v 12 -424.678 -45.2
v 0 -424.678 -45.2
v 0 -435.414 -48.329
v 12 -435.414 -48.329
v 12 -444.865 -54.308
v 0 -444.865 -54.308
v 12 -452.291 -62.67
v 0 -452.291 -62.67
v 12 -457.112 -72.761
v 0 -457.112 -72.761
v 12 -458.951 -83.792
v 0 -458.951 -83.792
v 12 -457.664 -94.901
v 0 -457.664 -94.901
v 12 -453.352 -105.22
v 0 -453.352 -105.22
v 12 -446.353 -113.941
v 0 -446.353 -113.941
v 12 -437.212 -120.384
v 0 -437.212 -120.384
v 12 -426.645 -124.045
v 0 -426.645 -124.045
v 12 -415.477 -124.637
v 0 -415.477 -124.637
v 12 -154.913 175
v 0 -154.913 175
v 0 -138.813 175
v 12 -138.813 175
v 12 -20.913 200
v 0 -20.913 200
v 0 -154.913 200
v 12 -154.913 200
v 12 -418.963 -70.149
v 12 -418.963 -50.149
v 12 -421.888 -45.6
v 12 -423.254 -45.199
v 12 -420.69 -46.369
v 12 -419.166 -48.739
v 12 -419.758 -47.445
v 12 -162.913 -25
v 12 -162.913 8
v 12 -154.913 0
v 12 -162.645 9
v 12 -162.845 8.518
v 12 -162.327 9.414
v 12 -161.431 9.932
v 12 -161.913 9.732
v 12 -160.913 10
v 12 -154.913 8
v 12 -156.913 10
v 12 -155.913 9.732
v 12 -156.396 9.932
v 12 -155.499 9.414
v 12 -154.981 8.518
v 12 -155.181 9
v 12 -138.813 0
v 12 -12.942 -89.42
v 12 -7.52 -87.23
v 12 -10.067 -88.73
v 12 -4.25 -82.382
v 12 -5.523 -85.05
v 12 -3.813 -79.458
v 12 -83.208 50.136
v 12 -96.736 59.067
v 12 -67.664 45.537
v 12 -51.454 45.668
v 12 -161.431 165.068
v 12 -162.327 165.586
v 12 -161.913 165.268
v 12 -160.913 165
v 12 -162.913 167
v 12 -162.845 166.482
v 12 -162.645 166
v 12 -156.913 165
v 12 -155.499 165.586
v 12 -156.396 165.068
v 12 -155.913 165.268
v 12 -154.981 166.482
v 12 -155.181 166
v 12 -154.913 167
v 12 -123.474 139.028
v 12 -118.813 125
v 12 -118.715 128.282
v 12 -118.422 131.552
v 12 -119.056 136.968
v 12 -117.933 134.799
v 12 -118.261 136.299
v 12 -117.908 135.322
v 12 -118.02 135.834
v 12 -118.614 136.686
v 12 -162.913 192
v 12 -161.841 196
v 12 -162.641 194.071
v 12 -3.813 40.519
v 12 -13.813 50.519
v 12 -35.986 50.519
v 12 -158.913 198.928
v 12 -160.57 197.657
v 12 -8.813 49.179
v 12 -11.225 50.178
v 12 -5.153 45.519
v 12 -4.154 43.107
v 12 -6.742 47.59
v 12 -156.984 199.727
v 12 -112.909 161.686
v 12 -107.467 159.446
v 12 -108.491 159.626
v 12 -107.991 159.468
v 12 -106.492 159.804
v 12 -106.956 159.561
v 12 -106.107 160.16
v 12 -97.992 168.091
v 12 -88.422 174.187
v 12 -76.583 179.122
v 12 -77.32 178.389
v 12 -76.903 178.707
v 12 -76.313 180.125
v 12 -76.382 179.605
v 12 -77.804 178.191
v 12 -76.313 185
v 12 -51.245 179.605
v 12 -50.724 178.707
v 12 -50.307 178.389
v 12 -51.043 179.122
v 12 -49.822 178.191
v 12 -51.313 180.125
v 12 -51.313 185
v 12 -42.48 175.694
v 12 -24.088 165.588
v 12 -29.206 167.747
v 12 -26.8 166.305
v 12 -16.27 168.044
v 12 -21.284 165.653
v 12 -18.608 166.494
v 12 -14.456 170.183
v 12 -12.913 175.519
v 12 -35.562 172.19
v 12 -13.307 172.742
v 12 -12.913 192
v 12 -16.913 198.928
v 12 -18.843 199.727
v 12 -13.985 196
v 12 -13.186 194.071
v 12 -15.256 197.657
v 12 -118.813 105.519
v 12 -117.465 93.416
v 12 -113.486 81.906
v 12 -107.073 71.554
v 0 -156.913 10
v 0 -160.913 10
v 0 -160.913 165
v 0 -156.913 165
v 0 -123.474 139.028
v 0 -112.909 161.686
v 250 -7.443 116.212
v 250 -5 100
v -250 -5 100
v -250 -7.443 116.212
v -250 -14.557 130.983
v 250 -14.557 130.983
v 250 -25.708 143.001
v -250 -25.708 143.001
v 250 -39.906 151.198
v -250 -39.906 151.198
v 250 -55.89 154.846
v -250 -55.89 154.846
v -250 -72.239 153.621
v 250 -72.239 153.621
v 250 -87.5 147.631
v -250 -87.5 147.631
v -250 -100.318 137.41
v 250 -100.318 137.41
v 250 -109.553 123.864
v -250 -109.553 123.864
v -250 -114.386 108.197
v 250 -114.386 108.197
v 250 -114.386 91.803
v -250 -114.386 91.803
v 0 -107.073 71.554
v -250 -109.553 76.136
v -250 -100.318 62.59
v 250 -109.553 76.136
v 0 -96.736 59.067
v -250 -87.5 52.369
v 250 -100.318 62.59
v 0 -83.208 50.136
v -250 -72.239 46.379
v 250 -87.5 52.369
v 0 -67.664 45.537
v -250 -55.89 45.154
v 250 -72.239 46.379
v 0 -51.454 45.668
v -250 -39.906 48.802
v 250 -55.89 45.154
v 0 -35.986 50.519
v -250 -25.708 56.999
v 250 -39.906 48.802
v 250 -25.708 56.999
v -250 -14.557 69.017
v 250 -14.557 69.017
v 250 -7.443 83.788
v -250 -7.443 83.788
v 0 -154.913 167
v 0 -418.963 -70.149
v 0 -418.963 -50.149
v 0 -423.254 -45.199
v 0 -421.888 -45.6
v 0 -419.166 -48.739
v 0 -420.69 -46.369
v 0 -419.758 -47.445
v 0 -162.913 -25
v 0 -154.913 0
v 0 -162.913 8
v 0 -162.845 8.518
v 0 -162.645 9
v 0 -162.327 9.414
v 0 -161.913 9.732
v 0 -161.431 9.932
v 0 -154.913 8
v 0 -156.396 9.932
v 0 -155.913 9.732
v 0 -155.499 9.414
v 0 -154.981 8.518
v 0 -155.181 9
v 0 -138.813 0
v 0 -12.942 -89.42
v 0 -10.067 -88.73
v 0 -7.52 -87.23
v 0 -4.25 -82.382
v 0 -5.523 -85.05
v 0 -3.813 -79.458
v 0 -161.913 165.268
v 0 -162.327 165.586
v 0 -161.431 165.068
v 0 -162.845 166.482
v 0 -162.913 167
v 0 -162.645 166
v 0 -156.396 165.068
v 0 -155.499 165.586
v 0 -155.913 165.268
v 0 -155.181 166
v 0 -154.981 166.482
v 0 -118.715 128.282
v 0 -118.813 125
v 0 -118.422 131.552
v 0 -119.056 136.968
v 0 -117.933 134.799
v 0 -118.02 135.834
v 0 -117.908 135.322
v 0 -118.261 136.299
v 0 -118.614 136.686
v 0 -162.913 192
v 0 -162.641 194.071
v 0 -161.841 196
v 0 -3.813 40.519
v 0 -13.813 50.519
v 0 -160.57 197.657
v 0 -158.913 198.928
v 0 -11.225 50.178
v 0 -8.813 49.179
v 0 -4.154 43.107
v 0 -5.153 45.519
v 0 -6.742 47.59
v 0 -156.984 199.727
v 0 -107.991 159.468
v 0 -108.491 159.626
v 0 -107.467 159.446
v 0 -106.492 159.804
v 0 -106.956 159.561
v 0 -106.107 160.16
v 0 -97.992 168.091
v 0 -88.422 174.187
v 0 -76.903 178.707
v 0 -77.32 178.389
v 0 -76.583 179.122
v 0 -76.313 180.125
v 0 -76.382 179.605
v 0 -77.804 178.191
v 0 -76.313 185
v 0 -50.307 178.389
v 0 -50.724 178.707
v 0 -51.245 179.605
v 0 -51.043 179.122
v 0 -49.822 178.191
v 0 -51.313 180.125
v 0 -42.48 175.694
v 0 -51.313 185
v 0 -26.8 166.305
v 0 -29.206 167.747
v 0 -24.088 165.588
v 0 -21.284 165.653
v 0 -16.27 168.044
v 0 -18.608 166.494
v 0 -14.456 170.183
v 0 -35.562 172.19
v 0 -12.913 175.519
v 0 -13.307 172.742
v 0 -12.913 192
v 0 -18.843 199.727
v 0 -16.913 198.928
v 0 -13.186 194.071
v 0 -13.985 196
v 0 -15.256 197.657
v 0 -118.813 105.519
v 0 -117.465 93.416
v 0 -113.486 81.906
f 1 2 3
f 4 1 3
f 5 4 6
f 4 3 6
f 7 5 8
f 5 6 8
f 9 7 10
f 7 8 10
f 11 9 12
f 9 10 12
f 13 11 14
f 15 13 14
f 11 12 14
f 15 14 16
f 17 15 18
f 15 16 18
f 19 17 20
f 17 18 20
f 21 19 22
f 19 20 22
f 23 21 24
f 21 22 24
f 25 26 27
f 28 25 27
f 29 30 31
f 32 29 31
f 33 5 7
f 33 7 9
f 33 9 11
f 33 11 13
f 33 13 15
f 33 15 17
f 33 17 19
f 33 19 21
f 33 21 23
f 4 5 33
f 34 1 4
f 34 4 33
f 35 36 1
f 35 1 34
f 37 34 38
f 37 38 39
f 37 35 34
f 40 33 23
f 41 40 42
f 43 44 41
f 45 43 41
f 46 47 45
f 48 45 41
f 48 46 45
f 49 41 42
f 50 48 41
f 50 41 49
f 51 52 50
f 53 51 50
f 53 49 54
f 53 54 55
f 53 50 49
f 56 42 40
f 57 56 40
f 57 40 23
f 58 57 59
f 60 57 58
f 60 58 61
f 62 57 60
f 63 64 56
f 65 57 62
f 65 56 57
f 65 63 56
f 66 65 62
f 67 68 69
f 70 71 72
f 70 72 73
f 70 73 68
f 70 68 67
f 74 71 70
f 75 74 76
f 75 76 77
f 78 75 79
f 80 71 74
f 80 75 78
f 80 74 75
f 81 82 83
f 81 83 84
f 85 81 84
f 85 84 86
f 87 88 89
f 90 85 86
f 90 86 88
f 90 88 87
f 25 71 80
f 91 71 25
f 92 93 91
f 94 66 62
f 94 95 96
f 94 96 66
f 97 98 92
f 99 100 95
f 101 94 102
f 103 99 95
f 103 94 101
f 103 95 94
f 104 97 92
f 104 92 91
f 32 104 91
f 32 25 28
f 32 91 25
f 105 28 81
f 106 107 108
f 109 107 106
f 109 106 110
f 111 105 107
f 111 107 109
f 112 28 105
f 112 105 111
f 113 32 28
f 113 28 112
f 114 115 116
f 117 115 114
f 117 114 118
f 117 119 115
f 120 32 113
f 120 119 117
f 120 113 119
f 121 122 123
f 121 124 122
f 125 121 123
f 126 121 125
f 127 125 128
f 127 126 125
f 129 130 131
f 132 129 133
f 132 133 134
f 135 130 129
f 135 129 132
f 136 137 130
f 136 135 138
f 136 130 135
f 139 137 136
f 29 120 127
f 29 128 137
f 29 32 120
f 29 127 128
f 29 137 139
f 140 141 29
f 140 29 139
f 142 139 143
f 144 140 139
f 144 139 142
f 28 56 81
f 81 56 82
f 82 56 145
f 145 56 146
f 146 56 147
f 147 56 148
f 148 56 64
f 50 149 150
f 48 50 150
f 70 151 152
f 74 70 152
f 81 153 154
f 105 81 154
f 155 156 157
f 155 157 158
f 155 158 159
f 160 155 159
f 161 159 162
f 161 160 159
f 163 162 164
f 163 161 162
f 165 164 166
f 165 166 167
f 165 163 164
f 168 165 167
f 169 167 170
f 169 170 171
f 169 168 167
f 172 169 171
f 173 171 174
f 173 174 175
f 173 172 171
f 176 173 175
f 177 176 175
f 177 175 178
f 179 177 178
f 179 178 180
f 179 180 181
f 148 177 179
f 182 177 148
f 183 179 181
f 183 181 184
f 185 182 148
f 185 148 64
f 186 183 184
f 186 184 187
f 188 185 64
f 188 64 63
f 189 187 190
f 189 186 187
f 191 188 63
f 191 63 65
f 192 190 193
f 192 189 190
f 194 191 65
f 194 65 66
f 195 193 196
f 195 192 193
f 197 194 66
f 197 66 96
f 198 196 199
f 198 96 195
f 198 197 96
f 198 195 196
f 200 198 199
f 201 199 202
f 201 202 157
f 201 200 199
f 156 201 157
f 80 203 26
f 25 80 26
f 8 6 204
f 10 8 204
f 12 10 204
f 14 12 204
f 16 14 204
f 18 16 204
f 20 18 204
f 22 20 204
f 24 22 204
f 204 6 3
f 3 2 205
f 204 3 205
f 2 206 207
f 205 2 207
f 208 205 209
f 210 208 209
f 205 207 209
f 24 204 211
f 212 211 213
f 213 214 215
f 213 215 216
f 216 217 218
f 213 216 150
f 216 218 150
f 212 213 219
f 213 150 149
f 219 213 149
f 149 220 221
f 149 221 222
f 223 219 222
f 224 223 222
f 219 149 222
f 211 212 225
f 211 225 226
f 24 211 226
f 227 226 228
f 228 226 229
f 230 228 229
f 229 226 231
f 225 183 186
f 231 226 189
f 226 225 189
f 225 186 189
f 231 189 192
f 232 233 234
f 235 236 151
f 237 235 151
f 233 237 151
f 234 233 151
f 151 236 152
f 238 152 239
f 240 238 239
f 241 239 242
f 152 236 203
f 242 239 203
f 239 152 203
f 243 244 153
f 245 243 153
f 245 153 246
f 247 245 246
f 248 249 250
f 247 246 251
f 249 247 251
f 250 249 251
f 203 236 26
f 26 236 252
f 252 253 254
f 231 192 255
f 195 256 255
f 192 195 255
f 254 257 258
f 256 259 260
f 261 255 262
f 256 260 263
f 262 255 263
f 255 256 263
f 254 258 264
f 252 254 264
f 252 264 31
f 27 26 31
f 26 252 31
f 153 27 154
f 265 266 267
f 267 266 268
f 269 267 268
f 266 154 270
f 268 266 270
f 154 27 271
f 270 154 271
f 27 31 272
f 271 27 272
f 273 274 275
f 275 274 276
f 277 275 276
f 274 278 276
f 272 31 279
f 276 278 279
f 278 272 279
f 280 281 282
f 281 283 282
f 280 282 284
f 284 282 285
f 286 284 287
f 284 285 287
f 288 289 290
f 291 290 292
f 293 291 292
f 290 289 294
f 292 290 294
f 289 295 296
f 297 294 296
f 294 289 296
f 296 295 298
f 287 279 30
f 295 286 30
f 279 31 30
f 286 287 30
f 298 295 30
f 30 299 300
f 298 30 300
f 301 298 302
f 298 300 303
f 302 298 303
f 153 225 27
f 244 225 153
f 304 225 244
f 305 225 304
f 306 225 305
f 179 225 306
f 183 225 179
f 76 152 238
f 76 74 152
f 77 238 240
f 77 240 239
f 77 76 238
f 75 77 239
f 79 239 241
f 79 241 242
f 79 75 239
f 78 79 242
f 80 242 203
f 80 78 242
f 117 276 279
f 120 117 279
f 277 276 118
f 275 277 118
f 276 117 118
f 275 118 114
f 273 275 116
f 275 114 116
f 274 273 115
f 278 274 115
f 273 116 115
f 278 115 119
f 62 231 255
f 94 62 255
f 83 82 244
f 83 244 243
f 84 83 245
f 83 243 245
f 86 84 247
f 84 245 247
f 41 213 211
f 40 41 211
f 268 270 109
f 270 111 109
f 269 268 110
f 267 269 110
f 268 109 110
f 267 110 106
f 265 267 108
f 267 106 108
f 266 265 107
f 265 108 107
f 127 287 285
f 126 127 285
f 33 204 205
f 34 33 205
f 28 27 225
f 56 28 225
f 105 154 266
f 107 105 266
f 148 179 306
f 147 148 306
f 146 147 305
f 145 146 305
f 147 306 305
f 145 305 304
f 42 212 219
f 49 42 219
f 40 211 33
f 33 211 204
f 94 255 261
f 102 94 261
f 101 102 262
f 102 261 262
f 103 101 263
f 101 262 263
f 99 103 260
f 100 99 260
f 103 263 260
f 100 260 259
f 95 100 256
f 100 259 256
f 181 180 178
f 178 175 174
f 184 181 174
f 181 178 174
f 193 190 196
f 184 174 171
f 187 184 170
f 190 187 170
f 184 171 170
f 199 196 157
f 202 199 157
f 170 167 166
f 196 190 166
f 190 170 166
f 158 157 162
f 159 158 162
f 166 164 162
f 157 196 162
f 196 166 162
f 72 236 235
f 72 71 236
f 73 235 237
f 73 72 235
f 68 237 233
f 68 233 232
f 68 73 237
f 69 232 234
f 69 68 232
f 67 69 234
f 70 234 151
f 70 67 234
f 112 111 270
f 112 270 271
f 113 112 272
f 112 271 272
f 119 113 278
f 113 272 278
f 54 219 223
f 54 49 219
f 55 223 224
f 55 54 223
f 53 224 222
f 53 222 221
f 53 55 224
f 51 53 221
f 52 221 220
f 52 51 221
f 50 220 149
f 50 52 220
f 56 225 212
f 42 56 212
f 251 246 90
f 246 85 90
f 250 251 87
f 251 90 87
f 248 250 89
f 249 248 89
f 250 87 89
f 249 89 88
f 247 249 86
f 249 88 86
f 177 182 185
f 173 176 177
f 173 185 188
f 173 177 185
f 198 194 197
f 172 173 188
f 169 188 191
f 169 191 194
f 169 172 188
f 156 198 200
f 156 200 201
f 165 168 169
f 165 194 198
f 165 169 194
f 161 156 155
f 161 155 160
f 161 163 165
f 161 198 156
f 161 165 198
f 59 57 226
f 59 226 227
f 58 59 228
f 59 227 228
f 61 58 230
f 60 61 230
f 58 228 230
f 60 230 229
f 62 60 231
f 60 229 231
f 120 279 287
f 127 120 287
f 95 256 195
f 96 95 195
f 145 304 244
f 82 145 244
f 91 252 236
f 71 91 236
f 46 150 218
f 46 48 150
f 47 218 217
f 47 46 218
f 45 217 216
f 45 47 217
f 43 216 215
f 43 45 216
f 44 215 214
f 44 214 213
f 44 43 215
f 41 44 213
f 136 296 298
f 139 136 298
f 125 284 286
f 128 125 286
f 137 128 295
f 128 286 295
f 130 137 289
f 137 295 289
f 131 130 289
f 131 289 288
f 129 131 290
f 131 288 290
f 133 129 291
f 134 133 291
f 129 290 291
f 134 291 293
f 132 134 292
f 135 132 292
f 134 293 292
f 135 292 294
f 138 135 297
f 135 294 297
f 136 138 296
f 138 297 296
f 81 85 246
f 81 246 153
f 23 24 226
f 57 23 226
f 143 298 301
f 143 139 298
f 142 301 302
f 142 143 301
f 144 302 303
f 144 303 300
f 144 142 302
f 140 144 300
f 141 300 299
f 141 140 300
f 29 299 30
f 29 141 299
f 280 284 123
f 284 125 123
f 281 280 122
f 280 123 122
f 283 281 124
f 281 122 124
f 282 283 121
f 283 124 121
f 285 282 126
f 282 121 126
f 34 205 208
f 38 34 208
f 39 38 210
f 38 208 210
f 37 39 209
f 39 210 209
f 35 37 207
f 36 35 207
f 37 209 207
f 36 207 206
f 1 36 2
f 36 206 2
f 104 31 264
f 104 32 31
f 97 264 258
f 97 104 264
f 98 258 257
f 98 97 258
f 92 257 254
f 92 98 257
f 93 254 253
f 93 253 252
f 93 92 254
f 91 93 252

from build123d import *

# Parameters (mm, degrees)
F0_R          = 55
F1_DEPTH      = 250
F1_DEPTH_BACK = 250
F3_DEPTH      = 12
F4_R          = 8
F5_R          = 2


with BuildPart() as f1:
    # F0 (on Right) → F1 (new body, two sides)
    with BuildSketch(Plane.YZ) as f1_sk:
        with Locations((-60, 100)):
            Circle(F0_R)
    extrude(amount=F1_DEPTH)
    extrude(f1_sk.sketch, amount=-F1_DEPTH_BACK)

    # F2 (on Right) → F3 (join)
    with BuildSketch(Plane.YZ):
        with BuildLine():
            ThreePointArc((-29.205577, 167.747019), (-18.607638, 166.4936), (-12.913269, 175.519204))
            Line((-12.913269, 175.519204), (-12.913269, 200))
            Line((-12.913269, 200), (-162.913269, 200))
            Line((-162.913269, 200), (-162.913269, 165))
            Line((-162.913269, 165), (-154.913269, 165))
            Line((-154.913269, 165), (-154.913269, 175))
            Line((-154.913269, 175), (-138.813269, 175))
            Line((-138.813269, 175), (-138.813269, 0))
            Line((-138.813269, 0), (-154.913269, 0))
            Line((-154.913269, 0), (-154.913269, 10))
            Line((-154.913269, 10), (-162.913269, 10))
            Line((-162.913269, 10), (-162.913269, -25))
            Line((-162.913269, -25), (-418.963285, -70.148526))
            Line((-418.963285, -70.148526), (-418.963285, -50.148526))
            ThreePointArc((-418.963285, -50.148526), (-420.690017, -46.368881), (-424.677571, -45.19981))
            ThreePointArc((-424.677571, -45.19981), (-458.697665, -89.391609), (-415.477055, -124.63733))
            Line((-415.477055, -124.63733), (-12.941712, -89.420051))
            ThreePointArc((-12.941712, -89.420051), (-6.440496, -86.214006), (-3.813269, -79.458104))
            Line((-3.813269, -79.458104), (-3.813269, 40.519204))
            ThreePointArc((-3.813269, 40.519204), (-6.742201, 47.590272), (-13.813269, 50.519204))
            Line((-13.813269, 50.519204), (-63.813269, 50.519204))
            ThreePointArc((-63.813269, 50.519204), (-102.704142, 66.628331), (-118.813269, 105.519204))
            Line((-118.813269, 105.519204), (-118.813269, 125))
            ThreePointArc((-118.813269, 125), (-118.518786, 130.683877), (-117.638489, 136.306888))
            Line((-117.638489, 136.306888), (-123.474465, 139.028248))
            Line((-123.474465, 139.028248), (-112.909008, 161.685943))
            Line((-112.909008, 161.685943), (-107.073032, 158.964583))
            ThreePointArc((-107.073032, 158.964583), (-93.364748, 171.38653), (-76.313269, 178.560713))
            Line((-76.313269, 178.560713), (-76.313269, 185))
            Line((-76.313269, 185), (-51.313269, 185))
            Line((-51.313269, 185), (-51.313269, 178.560713))
            ThreePointArc((-51.313269, 178.560713), (-39.646812, 174.406299), (-29.205577, 167.747019))
        make_face()
    extrude(amount=F3_DEPTH)

    # F4
    f4_edges = [f1.edges().sort_by_distance(p)[0] for p in [
        (6, -162.913269, 200),
        (6, -12.913269, 200),
    ]]
    fillet(f4_edges, radius=F4_R)

    # F5
    f5_edges = [f1.edges().sort_by_distance(p)[0] for p in [
        (6, -162.913269, 165),
        (6, -162.913269, 10),
        (6, -154.913269, 165),
        (6, -107.073032, 158.964583),
        (6, -117.638489, 136.306888),
        (6, -76.313269, 178.560713),
        (6, -51.313269, 178.560713),
        (6, -154.913269, 10),
    ]]
    fillet(f5_edges, radius=F5_R)


solid = f1.part
